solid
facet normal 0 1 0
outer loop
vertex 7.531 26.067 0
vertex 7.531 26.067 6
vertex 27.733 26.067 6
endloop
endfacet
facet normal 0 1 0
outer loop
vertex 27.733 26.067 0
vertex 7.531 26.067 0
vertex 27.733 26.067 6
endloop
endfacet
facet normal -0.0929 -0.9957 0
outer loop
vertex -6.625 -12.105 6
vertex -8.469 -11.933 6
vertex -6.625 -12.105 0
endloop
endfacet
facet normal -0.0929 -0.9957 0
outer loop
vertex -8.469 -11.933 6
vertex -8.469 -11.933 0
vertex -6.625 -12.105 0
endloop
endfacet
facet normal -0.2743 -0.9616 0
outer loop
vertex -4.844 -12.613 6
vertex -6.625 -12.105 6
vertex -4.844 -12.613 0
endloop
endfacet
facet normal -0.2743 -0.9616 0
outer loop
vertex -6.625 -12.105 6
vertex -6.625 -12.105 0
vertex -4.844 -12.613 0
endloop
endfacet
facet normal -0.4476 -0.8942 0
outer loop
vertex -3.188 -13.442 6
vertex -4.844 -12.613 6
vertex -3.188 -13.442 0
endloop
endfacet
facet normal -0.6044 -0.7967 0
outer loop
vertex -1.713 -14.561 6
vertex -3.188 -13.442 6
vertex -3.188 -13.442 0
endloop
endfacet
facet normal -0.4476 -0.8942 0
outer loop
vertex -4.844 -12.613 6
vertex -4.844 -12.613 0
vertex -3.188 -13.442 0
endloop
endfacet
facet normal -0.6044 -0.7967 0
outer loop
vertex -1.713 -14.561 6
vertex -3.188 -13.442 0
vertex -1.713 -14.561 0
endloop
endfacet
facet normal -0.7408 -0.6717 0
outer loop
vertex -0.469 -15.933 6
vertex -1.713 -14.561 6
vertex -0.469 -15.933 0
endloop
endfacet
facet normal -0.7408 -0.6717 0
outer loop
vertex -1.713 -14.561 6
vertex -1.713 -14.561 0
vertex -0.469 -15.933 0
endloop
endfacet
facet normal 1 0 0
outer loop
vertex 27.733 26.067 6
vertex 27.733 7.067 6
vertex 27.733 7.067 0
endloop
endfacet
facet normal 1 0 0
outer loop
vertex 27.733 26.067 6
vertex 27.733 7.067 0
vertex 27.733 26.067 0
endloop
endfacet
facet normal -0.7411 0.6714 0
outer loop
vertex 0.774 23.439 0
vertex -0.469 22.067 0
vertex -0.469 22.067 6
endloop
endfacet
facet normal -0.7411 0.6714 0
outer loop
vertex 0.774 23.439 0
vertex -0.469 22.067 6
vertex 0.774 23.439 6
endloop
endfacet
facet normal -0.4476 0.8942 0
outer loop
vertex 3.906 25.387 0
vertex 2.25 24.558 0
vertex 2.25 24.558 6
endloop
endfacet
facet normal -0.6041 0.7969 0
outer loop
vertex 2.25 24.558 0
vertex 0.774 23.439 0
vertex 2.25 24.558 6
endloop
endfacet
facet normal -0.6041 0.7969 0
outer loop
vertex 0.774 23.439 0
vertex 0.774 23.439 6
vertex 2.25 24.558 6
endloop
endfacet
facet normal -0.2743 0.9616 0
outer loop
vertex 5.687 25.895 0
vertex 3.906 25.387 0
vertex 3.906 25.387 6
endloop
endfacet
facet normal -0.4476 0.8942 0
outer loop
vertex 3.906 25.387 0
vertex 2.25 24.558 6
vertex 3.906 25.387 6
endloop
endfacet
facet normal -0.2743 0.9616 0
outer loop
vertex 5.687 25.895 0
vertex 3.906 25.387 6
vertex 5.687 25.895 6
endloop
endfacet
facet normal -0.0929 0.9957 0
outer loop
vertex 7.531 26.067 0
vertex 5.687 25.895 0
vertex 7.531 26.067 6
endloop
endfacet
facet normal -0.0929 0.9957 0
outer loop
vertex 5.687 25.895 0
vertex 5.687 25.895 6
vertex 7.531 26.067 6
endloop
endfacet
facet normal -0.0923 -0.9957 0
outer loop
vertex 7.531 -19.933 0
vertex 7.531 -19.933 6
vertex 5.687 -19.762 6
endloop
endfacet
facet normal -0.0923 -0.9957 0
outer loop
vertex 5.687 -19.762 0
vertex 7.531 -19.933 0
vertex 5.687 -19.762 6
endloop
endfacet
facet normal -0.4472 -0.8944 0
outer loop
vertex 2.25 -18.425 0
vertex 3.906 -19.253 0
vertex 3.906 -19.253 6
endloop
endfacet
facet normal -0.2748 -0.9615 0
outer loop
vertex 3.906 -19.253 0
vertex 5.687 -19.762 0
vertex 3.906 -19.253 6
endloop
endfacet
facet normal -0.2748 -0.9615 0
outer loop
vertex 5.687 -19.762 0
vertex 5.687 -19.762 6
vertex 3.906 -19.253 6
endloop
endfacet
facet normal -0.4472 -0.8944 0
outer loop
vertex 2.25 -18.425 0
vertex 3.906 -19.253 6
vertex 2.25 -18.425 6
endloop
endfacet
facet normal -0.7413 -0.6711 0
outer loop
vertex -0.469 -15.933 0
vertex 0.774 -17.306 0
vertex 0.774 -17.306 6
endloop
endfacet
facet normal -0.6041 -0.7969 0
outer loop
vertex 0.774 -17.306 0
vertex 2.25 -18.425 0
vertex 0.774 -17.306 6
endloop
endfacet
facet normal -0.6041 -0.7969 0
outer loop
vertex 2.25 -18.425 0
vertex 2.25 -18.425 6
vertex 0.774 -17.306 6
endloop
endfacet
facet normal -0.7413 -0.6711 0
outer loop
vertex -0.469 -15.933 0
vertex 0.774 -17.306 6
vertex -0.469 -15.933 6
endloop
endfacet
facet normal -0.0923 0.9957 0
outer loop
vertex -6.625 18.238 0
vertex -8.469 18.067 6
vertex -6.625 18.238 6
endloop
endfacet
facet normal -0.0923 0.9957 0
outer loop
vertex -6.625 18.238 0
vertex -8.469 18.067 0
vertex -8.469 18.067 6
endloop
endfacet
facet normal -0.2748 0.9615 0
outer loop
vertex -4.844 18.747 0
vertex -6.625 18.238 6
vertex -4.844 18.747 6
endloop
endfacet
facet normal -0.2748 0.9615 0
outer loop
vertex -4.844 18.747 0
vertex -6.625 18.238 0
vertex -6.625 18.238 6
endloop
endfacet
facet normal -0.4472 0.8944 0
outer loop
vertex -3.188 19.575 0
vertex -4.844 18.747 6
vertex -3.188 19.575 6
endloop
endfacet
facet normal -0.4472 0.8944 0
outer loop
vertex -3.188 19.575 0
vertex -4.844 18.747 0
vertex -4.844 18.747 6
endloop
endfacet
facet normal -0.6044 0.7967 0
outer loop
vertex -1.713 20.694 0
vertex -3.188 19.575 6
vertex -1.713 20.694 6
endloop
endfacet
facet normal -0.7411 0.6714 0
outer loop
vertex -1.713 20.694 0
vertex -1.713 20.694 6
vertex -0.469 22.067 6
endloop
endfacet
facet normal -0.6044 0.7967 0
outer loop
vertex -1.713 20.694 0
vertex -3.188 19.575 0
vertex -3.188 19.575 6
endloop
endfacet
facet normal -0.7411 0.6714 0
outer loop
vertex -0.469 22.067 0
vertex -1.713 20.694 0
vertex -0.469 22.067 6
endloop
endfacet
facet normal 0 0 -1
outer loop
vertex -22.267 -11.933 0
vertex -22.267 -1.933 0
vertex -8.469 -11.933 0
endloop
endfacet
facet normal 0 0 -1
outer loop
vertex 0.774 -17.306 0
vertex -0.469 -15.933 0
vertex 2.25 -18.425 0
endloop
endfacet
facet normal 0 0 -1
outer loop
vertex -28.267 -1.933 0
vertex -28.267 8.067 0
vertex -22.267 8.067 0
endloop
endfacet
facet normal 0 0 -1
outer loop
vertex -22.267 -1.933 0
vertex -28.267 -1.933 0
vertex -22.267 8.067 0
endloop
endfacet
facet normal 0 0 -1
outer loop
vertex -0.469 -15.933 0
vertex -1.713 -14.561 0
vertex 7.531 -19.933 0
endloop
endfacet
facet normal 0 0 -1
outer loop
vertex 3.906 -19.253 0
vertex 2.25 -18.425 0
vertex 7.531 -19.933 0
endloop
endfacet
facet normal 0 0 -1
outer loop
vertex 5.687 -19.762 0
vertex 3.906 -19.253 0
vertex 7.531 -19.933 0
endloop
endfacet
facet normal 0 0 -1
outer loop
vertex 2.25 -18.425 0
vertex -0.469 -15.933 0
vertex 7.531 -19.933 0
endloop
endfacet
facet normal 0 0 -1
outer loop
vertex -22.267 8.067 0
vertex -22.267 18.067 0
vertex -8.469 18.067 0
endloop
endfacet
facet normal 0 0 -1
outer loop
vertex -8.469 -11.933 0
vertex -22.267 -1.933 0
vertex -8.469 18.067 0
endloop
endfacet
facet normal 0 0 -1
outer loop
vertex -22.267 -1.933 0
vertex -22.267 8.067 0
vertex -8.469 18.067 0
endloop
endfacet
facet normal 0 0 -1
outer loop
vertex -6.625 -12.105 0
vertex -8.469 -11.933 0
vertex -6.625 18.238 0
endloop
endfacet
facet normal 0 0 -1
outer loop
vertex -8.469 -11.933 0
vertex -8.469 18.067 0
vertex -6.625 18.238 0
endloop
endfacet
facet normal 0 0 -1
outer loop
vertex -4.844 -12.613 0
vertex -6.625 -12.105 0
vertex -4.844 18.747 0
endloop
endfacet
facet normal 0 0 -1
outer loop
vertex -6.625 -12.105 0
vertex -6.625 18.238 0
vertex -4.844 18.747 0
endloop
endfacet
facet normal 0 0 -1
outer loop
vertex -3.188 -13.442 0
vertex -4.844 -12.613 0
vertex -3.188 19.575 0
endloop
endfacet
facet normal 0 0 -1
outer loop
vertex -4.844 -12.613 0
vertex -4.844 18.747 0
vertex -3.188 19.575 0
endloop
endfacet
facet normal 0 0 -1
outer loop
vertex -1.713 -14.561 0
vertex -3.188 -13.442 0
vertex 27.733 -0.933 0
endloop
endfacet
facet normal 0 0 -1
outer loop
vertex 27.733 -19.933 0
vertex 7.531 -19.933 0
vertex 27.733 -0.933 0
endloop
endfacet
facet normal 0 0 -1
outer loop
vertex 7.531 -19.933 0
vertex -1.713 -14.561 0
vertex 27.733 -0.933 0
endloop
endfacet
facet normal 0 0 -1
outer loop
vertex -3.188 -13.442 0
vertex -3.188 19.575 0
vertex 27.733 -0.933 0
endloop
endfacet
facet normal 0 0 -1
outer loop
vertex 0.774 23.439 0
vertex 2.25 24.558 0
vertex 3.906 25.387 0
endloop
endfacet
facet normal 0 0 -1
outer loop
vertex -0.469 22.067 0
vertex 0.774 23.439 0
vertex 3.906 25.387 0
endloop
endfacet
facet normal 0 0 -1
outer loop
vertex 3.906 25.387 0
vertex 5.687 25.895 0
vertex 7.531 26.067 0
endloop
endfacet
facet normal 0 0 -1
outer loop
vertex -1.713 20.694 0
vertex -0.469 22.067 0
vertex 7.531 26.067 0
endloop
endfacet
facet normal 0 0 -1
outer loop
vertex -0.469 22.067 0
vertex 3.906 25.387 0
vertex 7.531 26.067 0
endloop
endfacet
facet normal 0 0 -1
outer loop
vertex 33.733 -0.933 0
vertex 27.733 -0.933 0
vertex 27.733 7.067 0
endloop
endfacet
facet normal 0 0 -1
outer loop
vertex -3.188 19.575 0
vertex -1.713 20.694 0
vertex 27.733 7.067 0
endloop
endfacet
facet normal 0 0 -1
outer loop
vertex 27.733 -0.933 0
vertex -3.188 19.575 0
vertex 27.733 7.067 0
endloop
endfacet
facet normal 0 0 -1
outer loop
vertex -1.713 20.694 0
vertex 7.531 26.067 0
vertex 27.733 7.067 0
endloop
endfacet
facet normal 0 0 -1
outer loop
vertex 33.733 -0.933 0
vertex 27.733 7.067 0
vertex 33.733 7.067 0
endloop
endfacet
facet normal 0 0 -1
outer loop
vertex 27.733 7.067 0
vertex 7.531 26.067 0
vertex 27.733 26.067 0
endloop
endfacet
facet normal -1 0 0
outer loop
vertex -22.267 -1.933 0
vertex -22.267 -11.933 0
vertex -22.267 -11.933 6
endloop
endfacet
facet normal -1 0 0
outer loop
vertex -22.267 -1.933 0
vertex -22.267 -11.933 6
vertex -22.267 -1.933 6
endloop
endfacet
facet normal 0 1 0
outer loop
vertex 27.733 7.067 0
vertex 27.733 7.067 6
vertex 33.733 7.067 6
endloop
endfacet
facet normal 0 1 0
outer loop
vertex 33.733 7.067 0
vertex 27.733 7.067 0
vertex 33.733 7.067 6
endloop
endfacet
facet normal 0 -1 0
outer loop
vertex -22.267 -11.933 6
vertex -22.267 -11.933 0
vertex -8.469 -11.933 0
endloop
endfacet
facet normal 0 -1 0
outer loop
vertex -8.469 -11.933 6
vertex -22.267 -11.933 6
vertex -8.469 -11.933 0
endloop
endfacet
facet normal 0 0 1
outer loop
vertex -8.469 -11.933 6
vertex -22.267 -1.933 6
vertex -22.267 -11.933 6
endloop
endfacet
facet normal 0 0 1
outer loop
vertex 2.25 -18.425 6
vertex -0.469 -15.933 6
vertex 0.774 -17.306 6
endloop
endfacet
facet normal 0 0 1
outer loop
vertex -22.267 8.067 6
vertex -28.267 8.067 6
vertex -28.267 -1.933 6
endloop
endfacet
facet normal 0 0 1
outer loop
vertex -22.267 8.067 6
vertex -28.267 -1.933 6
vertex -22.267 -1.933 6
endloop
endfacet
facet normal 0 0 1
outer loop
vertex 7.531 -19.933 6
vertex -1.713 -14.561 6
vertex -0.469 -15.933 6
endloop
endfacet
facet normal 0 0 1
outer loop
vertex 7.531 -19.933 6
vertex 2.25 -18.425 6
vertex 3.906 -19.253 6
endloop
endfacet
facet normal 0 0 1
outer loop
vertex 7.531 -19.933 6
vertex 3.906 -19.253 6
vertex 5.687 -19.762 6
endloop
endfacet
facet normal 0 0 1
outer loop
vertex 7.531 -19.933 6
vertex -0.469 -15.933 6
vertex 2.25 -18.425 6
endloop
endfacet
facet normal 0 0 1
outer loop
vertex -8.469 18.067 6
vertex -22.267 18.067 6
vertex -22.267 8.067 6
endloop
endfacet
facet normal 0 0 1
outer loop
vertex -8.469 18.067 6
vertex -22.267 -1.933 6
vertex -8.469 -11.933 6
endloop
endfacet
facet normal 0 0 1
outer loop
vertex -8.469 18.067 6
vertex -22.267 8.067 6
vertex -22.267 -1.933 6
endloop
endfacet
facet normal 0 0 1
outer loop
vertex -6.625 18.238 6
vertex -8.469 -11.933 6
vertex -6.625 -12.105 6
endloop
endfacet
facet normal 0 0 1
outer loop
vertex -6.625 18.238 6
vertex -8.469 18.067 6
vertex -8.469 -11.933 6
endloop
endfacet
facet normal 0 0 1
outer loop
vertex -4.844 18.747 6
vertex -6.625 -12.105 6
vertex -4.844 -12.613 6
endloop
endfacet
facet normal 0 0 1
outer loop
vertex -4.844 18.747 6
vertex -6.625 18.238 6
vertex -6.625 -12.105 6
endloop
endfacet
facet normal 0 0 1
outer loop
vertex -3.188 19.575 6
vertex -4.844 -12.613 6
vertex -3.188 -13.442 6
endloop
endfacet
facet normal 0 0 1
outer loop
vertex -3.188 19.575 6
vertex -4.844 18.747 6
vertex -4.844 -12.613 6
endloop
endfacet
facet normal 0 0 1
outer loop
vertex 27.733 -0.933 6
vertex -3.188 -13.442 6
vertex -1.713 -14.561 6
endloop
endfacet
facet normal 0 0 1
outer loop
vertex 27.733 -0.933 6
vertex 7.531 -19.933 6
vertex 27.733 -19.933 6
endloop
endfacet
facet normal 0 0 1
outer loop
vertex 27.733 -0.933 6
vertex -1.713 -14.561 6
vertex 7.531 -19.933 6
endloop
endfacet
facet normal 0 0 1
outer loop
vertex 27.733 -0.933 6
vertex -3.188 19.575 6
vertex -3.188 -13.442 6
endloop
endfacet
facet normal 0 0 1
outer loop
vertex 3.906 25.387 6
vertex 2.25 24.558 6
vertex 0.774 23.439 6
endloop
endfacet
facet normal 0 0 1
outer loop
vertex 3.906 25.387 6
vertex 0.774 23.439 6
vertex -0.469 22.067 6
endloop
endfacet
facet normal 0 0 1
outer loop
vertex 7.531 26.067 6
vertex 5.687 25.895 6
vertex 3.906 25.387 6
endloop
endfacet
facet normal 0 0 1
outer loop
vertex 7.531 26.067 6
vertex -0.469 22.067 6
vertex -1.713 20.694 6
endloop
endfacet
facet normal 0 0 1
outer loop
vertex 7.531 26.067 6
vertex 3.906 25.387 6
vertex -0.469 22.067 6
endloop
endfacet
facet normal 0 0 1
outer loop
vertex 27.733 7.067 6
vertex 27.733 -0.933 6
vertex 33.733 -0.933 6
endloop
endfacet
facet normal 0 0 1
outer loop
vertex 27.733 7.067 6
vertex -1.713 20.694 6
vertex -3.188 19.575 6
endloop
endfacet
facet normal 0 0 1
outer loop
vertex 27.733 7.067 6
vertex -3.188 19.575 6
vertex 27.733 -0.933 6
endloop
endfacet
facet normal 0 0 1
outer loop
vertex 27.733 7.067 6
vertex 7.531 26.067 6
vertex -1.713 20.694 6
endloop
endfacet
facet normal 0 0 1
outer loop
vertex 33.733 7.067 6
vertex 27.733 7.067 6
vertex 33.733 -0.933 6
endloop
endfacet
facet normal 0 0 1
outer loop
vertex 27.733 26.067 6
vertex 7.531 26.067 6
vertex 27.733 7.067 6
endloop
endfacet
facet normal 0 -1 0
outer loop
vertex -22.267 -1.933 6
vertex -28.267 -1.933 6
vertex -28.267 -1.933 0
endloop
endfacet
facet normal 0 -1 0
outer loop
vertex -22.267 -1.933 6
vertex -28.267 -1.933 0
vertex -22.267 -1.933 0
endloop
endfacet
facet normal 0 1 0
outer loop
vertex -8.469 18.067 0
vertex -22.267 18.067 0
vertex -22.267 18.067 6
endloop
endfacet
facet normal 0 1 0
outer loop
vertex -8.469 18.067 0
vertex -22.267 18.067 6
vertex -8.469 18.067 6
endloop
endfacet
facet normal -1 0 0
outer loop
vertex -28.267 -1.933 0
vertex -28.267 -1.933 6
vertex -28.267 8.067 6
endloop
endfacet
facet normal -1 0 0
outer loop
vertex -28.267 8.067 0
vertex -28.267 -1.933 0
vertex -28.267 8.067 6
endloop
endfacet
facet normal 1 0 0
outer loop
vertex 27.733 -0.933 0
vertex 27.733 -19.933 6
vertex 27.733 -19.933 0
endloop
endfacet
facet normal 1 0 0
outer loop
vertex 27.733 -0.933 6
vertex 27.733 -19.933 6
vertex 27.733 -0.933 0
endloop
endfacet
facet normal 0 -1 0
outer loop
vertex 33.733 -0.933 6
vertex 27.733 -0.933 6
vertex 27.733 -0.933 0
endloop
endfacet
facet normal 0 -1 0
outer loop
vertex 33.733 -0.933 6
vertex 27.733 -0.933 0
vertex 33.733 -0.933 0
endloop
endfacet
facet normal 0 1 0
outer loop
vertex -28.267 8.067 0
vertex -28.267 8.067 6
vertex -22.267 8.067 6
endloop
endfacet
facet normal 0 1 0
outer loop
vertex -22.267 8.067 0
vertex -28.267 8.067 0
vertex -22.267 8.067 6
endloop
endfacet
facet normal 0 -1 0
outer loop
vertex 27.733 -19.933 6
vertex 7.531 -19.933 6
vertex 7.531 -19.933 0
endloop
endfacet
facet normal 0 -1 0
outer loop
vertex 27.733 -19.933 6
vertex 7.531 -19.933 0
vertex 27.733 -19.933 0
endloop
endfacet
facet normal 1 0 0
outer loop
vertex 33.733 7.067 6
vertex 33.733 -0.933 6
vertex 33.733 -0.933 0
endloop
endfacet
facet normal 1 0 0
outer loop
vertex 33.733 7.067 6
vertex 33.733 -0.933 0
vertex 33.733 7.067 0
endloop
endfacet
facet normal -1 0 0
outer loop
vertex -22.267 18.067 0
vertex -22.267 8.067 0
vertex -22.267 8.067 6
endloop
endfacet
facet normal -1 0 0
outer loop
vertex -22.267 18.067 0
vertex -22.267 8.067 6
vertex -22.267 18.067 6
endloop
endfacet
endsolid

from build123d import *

# Parameters (mm, degrees)
ESQUISSE1_W        = 50
ESQUISSE1_H        = 30
BOSS_EXTRU_1_DEPTH = 6
ESQUISSE3_W        = 30
ESQUISSE3_H        = 8
BOSS_EXTRU_2_DEPTH = 6
CONG_1_R           = 10
CONG_2_R           = 10
CONG_3_R           = 10
CONG_4_R           = 10
ESQUISSE7_W        = 6
ESQUISSE7_H        = 10
ESQUISSE7_H_2      = 8
BOSS_EXTRU_3_DEPTH = 6


with BuildPart() as part:
    # Esquisse1 → Boss.-Extru.1 (new body)
    with BuildSketch(Plane.XY):
        with Locations((2.73294214, 3.066688104)):
            Rectangle(ESQUISSE1_W, ESQUISSE1_H)
    extrude(amount=BOSS_EXTRU_1_DEPTH)

    # Esquisse3 → Boss.-Extru.2 (add)
    with BuildSketch(Plane.XY.offset(6)):
        with Locations((12.73294214, 22.066688104)):
            Rectangle(ESQUISSE3_W, ESQUISSE3_H)
        with Locations((12.73294214, -15.933311896)):
            Rectangle(ESQUISSE3_W, ESQUISSE3_H)
    extrude(amount=-BOSS_EXTRU_2_DEPTH)

    # Congé1
    # the kernel refuses this fillet: 10 mm, written as the material it takes off along each edge
    with BuildSketch(Plane(origin=(-2.26705786, 26.066688104, 30.494897428), x_dir=(1, 0, 0), z_dir=(0, 0, -1))) as cong_1_piece_1:
        with BuildLine():
            CenterArc((9.797958971, 10), CONG_1_R, 191.536959033, 78.463040967)
            Line((0, 8), (-0.195959179, 7.96))
            ThreePointArc((-0.195959179, 7.96), (-0.2, 4), (-0.2, 0))
            Line((-0.2, 0), (0, -0.2))
            Line((0, -0.2), (9.797958971, -0.2))
            Line((9.797958971, -0.2), (9.797958971, 0))
        make_face()
    extrude(amount=54.989794856, mode=Mode.SUBTRACT)

    # Congé2
    # the kernel refuses this fillet: 10 mm, written as the material it takes off along each edge
    with BuildSketch(Plane(origin=(-2.26705786, -19.933311896, 30.494897428), x_dir=(0, 1, 0), z_dir=(0, 0, -1))) as cong_2_piece_1:
        with BuildLine():
            CenterArc((10, 9.797958971), CONG_2_R, 180, 78.463040967)
            Line((0, 9.797958971), (-0.2, 9.797958971))
            Line((-0.2, 9.797958971), (-0.2, 0))
            Line((-0.2, 0), (0, -0.2))
            ThreePointArc((0, -0.2), (4, -0.2), (7.96, -0.195959179))
            Line((7.96, -0.195959179), (8, 0))
        make_face()
    extrude(amount=54.989794856, mode=Mode.SUBTRACT)

    # Congé3
    cong_3_edges = [part.edges().sort_by_distance(p)[0] for p in [
        (-2.26705786, 18.066688104, 3),
    ]]
    fillet(cong_3_edges, radius=CONG_3_R)

    # Congé4
    cong_4_edges = [part.edges().sort_by_distance(p)[0] for p in [
        (-2.26705786, -11.933311896, 3),
    ]]
    fillet(cong_4_edges, radius=CONG_4_R)

    # Esquisse7 → Boss.-Extru.3 (add)
    with BuildSketch(Plane.XY.offset(6)):
        with Locations((-25.26705786, 3.066688104)):
            Rectangle(ESQUISSE7_W, ESQUISSE7_H)
        with Locations((30.73294214, 3.066688104)):
            Rectangle(ESQUISSE7_W, ESQUISSE7_H_2)
    extrude(amount=-BOSS_EXTRU_3_DEPTH)


solid = part.part
